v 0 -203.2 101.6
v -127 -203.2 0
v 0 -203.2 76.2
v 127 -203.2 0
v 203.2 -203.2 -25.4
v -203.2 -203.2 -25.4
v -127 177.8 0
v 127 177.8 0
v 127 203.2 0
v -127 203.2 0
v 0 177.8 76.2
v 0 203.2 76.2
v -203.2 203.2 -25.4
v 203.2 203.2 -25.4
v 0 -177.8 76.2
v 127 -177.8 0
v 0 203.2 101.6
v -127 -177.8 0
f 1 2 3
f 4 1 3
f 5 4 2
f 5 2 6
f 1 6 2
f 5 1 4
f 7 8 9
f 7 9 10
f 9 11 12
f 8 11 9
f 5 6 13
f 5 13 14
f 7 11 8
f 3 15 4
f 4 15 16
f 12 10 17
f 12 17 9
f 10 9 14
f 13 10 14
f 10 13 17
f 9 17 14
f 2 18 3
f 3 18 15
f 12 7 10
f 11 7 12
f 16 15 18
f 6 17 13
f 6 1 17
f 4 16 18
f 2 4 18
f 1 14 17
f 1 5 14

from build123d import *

# Parameters (mm, degrees)
F1_DEPTH = 177.8
F2_DEPTH = 177.8
F3_DEPTH = 203.2
F4_DEPTH = 203.2


with BuildPart() as f1:
    # F0 (on Front) → F1 (new body)
    with BuildSketch(Plane.XZ):
        Polygon((-127, 0), (0, 0), (0, 76.2), align=None)
        Polygon((0, 76.2), (0, 0), (127, 0), align=None)
    extrude(amount=F1_DEPTH)

    # F2 (add): a face of the model
    f2_faces = [f1.faces().sort_by_distance(p)[0] for p in [
        (0, 0, 25.4),
    ]]
    extrude(f2_faces, amount=F2_DEPTH)

    # F0 (on Front) → F3 (join)
    with BuildSketch(Plane.XZ):
        Polygon((0, 101.6), (-203.2, -25.4), (203.2, -25.4), align=None)
        Polygon((127, 0), (0, 0), (-127, 0), (0, 76.2), align=None, mode=Mode.SUBTRACT)
    extrude(amount=F3_DEPTH)

    # F0 (on Front) → F4 (join)
    with BuildSketch(Plane.XZ):
        Polygon((0, 101.6), (-203.2, -25.4), (203.2, -25.4), align=None)
        Polygon((127, 0), (0, 0), (-127, 0), (0, 76.2), align=None, mode=Mode.SUBTRACT)
    extrude(amount=-F4_DEPTH)


solid = f1.part
